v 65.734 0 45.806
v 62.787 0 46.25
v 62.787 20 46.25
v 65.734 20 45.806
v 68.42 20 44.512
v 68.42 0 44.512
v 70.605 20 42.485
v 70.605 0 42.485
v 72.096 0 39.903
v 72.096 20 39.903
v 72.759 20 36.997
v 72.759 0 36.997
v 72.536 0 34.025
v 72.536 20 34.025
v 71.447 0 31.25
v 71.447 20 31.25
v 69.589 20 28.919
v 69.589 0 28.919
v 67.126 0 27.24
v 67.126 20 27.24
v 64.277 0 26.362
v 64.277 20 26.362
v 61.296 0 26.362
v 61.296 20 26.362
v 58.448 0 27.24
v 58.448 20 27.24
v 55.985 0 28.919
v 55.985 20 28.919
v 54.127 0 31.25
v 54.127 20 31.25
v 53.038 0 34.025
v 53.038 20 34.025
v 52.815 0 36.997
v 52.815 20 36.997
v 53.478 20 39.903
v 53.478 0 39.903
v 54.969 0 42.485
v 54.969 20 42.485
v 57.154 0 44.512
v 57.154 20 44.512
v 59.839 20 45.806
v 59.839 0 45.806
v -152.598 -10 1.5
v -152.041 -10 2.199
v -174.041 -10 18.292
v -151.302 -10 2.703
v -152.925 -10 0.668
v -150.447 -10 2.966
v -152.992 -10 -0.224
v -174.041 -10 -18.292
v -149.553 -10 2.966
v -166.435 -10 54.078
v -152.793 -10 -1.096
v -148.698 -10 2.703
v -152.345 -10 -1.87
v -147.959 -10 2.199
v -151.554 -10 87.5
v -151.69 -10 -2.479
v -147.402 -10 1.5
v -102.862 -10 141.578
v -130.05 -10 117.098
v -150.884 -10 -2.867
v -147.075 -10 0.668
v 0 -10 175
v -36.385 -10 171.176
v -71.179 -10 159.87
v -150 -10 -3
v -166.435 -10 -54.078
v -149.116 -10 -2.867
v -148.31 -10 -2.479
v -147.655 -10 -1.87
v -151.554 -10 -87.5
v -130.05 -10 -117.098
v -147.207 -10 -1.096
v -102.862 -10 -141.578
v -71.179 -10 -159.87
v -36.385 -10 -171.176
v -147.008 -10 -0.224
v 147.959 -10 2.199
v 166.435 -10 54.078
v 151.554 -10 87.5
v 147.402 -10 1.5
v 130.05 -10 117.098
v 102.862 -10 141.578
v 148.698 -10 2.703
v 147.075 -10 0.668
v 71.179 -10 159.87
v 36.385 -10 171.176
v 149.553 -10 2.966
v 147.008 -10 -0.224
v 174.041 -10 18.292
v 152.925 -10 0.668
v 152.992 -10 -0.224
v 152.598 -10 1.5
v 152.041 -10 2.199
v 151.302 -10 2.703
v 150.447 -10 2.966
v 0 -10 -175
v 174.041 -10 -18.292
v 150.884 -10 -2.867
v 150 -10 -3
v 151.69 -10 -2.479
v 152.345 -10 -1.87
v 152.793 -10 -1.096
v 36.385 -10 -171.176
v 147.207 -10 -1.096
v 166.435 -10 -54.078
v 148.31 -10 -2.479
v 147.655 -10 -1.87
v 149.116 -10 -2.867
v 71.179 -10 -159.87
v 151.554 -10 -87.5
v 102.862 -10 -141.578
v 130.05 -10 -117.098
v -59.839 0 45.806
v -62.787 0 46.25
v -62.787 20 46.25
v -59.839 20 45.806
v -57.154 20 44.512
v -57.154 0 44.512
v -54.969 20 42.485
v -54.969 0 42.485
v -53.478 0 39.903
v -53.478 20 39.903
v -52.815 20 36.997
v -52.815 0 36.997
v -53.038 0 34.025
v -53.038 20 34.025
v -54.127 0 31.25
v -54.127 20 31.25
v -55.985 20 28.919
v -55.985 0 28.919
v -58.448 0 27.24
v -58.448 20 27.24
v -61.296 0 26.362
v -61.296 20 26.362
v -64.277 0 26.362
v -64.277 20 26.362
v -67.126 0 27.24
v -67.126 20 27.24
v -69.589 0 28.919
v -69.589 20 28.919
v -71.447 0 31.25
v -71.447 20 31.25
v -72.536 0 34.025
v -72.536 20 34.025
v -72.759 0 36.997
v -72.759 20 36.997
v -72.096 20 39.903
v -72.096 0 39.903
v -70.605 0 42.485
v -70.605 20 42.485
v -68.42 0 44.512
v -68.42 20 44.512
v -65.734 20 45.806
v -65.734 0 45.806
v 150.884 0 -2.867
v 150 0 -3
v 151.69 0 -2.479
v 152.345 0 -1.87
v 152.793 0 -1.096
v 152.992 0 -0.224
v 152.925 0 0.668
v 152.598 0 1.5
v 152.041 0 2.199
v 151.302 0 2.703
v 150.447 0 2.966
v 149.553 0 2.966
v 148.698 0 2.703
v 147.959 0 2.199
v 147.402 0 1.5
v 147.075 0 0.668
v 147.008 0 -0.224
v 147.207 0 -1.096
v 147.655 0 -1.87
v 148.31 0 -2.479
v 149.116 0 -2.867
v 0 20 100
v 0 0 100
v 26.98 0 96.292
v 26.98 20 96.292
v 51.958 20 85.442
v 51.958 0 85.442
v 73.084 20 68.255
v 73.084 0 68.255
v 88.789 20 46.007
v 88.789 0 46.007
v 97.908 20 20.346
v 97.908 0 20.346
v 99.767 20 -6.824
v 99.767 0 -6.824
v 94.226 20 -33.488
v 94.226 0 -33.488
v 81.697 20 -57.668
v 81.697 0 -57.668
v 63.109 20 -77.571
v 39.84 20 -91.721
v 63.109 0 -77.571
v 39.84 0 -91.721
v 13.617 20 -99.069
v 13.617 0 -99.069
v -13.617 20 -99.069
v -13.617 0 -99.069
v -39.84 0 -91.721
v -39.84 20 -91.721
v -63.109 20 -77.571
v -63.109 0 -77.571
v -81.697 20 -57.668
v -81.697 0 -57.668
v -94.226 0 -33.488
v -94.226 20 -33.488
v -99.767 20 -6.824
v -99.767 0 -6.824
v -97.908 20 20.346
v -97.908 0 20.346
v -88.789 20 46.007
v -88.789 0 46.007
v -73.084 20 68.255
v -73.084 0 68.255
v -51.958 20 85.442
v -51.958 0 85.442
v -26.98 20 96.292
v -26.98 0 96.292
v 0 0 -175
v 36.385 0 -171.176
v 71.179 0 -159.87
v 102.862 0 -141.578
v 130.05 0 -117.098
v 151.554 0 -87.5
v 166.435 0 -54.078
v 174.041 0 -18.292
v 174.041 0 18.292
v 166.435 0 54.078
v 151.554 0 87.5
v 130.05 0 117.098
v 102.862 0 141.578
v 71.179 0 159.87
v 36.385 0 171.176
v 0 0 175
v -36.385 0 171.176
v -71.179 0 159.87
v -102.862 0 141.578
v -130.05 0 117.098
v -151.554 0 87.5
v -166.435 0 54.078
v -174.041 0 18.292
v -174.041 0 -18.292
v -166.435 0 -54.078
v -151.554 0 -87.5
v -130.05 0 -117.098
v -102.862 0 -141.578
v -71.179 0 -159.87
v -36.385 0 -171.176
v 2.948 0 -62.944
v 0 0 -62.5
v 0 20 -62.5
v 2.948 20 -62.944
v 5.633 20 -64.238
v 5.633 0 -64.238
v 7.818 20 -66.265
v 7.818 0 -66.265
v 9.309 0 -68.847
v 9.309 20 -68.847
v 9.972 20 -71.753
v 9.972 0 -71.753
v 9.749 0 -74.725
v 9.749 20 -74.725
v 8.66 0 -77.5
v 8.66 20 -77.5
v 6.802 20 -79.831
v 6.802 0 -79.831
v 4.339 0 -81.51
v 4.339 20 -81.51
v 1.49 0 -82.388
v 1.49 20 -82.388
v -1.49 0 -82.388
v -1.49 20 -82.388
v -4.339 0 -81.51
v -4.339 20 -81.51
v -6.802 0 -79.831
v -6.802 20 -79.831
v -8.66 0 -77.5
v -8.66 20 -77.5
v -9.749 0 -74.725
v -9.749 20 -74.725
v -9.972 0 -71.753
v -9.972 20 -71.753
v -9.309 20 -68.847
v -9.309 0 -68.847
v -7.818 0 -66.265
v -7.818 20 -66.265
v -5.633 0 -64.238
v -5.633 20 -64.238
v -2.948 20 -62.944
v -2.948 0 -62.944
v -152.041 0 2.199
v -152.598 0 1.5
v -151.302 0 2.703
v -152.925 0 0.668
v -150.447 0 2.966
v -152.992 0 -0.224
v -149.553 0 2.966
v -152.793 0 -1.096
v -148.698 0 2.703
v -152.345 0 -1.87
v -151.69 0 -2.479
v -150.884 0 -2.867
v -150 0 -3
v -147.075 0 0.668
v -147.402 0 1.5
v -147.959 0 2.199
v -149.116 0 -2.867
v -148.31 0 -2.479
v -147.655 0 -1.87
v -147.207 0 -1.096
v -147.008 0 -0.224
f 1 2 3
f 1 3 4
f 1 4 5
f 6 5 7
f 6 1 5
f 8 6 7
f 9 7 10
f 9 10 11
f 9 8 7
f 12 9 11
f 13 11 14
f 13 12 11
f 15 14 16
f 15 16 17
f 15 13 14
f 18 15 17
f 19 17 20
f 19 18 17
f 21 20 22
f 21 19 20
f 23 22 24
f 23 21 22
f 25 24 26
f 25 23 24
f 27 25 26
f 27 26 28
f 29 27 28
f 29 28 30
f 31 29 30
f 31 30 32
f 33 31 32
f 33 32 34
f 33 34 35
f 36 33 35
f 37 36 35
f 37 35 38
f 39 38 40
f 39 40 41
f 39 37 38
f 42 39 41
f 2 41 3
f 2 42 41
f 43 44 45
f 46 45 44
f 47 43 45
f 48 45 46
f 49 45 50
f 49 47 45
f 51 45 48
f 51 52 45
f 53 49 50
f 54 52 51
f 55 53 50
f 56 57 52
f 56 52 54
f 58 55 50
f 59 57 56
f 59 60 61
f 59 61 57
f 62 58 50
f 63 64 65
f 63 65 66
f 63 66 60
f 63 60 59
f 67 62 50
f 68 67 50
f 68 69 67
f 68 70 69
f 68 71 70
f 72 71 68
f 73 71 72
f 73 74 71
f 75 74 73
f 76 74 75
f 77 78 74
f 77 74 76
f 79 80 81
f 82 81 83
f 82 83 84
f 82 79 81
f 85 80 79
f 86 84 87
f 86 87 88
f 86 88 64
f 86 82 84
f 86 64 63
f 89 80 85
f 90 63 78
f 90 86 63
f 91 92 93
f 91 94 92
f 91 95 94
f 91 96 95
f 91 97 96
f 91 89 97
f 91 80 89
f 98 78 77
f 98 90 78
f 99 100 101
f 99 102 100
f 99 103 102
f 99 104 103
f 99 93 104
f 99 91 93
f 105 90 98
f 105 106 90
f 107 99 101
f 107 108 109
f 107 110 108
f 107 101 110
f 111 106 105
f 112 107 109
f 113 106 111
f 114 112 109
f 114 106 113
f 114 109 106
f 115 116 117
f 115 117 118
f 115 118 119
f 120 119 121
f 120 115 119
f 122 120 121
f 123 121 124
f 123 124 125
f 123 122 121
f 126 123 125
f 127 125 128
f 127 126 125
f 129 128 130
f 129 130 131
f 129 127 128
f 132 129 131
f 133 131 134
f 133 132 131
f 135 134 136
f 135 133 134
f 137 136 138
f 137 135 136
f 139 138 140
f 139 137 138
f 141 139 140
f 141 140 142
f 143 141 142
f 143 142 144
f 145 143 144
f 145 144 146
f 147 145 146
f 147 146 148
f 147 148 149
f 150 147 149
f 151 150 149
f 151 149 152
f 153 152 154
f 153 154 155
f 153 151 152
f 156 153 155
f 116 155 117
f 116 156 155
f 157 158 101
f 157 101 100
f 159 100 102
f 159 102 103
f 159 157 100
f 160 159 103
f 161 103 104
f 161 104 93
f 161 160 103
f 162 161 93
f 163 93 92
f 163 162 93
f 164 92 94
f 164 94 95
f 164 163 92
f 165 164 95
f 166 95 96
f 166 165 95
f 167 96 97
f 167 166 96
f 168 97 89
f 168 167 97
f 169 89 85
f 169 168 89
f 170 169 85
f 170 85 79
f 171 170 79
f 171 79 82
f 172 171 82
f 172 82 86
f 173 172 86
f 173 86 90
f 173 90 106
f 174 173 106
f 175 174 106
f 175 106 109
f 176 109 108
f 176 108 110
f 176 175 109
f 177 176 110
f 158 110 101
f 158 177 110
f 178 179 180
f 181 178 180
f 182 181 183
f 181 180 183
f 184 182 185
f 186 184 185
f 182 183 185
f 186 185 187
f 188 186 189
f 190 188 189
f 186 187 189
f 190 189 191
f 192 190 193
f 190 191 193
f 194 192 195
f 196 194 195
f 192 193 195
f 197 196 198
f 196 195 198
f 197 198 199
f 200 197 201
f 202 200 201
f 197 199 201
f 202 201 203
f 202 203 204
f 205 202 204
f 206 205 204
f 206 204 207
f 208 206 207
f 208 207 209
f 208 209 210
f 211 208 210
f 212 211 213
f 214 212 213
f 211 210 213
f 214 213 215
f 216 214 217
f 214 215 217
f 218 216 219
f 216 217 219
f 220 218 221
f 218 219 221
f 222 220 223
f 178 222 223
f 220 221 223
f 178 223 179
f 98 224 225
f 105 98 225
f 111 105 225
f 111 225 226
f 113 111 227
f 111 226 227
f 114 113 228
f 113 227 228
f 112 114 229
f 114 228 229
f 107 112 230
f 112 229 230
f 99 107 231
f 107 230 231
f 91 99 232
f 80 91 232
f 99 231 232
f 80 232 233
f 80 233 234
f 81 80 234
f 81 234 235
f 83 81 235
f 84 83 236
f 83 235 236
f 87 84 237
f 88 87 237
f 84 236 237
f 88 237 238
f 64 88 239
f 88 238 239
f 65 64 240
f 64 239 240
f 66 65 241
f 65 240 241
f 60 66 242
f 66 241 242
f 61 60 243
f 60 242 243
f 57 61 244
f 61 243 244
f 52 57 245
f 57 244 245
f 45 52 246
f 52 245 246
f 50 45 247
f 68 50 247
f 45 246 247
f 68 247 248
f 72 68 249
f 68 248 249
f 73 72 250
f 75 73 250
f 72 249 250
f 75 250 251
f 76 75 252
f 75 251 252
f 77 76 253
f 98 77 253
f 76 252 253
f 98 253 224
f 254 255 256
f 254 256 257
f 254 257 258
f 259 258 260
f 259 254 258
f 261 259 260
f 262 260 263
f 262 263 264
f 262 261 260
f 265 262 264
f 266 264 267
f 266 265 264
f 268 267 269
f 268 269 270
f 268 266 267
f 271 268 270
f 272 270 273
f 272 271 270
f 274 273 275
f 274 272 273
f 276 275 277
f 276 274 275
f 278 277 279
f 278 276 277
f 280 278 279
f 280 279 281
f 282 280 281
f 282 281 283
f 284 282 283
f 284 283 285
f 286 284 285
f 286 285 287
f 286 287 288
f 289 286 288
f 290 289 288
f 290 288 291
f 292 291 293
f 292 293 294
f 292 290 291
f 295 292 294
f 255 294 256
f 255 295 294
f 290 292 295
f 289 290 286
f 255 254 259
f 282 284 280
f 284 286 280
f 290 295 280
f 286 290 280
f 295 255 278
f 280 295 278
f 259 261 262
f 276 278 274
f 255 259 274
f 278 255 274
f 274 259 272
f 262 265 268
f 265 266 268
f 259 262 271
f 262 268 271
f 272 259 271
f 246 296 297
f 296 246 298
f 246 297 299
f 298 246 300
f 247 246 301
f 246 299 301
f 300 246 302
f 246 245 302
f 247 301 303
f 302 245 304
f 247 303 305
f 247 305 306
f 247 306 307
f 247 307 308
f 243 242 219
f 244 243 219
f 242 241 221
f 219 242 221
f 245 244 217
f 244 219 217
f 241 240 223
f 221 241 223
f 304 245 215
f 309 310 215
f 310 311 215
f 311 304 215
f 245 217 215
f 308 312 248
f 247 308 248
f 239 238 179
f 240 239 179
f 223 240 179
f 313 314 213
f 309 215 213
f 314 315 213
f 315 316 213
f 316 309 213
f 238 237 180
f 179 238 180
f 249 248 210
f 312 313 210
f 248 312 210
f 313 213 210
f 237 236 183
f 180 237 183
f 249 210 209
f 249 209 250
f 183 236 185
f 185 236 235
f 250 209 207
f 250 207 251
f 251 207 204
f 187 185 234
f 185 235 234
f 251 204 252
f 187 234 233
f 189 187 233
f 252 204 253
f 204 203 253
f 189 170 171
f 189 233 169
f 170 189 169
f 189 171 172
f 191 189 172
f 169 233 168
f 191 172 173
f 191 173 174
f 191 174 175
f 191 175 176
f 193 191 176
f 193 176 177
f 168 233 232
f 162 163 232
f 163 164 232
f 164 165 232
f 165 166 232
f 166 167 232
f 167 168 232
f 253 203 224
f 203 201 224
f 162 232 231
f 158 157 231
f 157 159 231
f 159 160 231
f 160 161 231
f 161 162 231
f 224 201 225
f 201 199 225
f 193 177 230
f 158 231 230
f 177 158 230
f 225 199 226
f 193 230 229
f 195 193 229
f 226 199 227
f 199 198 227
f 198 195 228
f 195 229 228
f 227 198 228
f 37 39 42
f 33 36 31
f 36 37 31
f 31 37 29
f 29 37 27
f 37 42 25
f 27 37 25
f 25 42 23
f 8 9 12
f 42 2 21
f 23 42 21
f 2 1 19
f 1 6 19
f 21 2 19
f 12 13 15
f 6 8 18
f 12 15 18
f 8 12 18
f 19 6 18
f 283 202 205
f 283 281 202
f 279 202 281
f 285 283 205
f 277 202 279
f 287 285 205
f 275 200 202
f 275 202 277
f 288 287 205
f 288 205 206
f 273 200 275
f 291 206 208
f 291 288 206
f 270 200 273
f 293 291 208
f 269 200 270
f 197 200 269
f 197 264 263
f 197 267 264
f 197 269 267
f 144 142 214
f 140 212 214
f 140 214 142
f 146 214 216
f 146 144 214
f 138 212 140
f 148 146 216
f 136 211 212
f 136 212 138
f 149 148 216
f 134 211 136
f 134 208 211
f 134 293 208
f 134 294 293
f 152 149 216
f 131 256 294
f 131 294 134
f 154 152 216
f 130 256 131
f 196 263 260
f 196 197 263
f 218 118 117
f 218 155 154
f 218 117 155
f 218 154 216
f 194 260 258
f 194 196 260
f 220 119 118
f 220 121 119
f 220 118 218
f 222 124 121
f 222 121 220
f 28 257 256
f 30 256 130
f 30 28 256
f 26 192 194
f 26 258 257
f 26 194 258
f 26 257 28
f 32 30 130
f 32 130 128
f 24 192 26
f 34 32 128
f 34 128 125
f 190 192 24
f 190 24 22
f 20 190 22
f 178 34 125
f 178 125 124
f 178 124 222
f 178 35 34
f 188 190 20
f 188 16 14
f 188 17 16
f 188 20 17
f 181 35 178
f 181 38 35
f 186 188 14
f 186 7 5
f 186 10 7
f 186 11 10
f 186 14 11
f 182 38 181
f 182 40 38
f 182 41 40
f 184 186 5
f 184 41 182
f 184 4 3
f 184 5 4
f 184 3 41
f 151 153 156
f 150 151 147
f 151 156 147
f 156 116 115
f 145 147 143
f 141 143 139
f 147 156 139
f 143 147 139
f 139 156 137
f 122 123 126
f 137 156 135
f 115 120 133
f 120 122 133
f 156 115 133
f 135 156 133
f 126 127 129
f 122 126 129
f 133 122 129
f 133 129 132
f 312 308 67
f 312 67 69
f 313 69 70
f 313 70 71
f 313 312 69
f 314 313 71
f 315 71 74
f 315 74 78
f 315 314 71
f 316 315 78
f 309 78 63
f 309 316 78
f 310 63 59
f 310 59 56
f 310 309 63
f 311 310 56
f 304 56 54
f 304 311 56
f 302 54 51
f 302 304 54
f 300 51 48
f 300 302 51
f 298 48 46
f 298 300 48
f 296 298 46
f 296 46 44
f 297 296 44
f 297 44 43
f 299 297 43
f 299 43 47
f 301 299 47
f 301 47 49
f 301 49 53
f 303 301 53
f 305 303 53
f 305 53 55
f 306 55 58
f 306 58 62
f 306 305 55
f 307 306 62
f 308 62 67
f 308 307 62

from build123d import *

# Parameters (mm, degrees)
SKETCH_1_R      = 100
SKETCH_1_R_2    = 10
EXTRUDE_1_DEPTH = 20
SKETCH_2_R      = 175
SKETCH_2_R_2    = 3
EXTRUDE_2_DEPTH = 10


with BuildPart() as part:
    # 草圖1 → 填料-伸長1 (new body)
    with BuildSketch(Plane(origin=(0, 0, 0), x_dir=(1, 0, 0), z_dir=(0, 1, 0))):
        with Locations(Location((0, 0, 0), (0, 0, 270))):
            Circle(SKETCH_1_R)
        with Locations(Location((0, 72.5, 0), (0, 0, 270))):
            Circle(SKETCH_1_R_2, mode=Mode.SUBTRACT)
        with Locations(Location((62.786841774, -36.25, 0), (0, 0, 270))):
            Circle(SKETCH_1_R_2, mode=Mode.SUBTRACT)
        with Locations(Location((-62.786841774, -36.25, 0), (0, 0, 270))):
            Circle(SKETCH_1_R_2, mode=Mode.SUBTRACT)
    extrude(amount=EXTRUDE_1_DEPTH)

    # 草圖2 → 填料-伸長2 (add)
    with BuildSketch(Plane.XZ):
        with Locations(Location((0, 0, 0), (0, 0, 270))):
            Circle(SKETCH_2_R)
        with Locations(Location((-150, 0, 0), (0, 0, 270))):
            Circle(SKETCH_2_R_2, mode=Mode.SUBTRACT)
        with Locations(Location((150, 0, 0), (0, 0, 270))):
            Circle(SKETCH_2_R_2, mode=Mode.SUBTRACT)
    extrude(amount=EXTRUDE_2_DEPTH)


solid = part.part
